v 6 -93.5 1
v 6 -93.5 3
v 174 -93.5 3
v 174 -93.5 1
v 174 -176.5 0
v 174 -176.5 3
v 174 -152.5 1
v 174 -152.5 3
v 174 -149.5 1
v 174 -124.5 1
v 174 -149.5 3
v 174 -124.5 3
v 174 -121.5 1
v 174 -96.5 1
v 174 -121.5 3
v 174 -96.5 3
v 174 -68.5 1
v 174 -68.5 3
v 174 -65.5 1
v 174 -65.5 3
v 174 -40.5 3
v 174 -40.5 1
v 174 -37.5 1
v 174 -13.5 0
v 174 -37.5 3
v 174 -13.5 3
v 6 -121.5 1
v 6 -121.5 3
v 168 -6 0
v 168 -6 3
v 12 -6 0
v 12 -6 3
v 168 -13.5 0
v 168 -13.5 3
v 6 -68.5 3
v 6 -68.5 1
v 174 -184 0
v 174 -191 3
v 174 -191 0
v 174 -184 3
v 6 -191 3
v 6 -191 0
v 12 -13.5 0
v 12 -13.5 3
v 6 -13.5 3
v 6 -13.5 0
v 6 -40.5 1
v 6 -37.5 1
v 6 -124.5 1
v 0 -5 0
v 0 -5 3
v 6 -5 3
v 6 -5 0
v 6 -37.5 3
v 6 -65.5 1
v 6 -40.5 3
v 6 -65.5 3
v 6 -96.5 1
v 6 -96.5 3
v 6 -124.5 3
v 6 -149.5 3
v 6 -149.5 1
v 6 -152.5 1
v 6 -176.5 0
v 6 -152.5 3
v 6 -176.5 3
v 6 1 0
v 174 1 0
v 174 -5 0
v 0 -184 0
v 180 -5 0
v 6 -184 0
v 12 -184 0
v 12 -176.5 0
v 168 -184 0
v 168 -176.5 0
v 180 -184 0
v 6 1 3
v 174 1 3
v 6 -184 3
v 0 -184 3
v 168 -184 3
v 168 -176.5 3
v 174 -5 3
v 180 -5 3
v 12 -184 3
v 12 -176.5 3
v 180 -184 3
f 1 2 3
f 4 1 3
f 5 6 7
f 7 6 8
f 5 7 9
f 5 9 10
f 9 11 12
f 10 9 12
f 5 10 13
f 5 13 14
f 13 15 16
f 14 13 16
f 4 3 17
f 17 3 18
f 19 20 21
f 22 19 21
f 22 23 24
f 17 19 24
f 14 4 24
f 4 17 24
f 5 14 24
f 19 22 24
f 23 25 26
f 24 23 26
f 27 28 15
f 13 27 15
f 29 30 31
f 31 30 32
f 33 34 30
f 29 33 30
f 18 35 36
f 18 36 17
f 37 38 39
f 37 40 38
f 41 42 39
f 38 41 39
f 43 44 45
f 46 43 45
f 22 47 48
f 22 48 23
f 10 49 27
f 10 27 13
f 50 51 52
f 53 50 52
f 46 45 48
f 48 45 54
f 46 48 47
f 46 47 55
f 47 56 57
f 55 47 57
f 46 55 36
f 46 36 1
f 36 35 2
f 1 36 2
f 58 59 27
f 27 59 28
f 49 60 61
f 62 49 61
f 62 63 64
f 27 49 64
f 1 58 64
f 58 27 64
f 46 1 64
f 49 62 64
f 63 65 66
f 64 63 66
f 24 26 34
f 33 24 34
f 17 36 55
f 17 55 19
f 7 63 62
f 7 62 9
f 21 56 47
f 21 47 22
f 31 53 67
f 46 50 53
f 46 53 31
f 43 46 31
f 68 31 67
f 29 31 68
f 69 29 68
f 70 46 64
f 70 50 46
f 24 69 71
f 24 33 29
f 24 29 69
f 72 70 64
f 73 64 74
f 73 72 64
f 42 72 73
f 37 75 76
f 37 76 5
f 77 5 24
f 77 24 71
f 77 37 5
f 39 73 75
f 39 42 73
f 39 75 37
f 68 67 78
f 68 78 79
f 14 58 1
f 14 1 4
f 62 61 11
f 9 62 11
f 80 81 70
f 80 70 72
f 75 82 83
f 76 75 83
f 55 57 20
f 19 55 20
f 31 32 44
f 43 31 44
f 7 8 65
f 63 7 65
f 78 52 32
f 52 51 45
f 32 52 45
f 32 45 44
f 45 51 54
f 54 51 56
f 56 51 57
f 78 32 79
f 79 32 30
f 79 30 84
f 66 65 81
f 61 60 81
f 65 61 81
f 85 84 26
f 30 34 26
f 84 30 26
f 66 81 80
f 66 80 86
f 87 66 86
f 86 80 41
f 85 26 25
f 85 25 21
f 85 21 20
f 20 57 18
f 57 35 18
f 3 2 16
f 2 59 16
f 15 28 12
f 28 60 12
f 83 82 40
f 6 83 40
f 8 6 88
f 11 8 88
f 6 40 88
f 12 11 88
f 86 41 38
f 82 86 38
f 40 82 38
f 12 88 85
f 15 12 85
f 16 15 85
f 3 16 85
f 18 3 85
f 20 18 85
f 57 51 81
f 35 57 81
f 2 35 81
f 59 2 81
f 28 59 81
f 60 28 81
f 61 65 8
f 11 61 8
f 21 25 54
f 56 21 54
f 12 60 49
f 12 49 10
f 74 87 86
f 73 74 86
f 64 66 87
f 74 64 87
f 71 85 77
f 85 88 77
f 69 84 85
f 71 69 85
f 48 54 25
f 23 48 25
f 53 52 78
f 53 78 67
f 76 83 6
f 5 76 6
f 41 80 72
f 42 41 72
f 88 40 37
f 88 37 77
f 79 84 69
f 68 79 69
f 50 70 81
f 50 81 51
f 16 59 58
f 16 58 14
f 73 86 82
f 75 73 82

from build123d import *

# Parameters (mm, degrees)
F0_W      = 180
F0_H      = 190
F1_DEPTH  = 3
F2_W      = 6
F2_H      = 6
F3_DEPTH  = 3.001
F4_W      = 168
F4_H      = 25
F5_DEPTH  = 3.001
F6_DEPTH  = 1
F7_DEPTH  = 1
F8_DEPTH  = 1
F9_W      = 168
F9_H      = 134.1867442131
F10_DEPTH = 1


with BuildPart() as f1:
    # F0 (on Top) → F1 (new body)
    with BuildSketch(Plane.XY):
        with Locations((90, -95)):
            Rectangle(F0_W, F0_H)
    extrude(amount=F1_DEPTH)

    # F2 (on face) → F3 (cut, through all)
    with BuildSketch(Plane.XY.offset(3)):
        with Locations((3, -187)):
            Rectangle(F2_W, F2_H)
        with Locations((177, -187)):
            Rectangle(F2_W, F2_H)
        with Locations((177, -3)):
            Rectangle(F2_W, F2_H)
        with Locations((3, -3)):
            Rectangle(F2_W, F2_H)
    extrude(amount=-F3_DEPTH, mode=Mode.SUBTRACT)

    # F4 (on face) → F5 (cut, through all)
    with BuildSketch(Plane.XY.offset(3)):
        Polygon((6, -152.5), (6, -176.5), (12, -176.5), (12, -184), (168, -184), (168, -176.5), (174, -176.5), (174, -152.5), align=None)
        with Locations((90, -137)):
            Rectangle(F4_W, F4_H)
        with Locations((90, -109)):
            Rectangle(F4_W, F4_H)
        with Locations((90, -81)):
            Rectangle(F4_W, F4_H)
        with Locations((90, -53)):
            Rectangle(F4_W, F4_H)
        Polygon((6, -13.5), (6, -37.5), (174, -37.5), (174, -13.5), (167.9999051407, -13.5), (168, -6.0000000006), (12, -6), (11.9999051407, -13.5), align=None)
    extrude(amount=-F5_DEPTH, mode=Mode.SUBTRACT)

    # F6 (add): a face of the model
    f6_faces = [f1.faces().sort_by_distance(p)[0] for p in [
        (90, -190, 1.5),
    ]]
    extrude(f6_faces, amount=F6_DEPTH)

    # F7 (add): a face of the model
    f7_faces = [f1.faces().sort_by_distance(p)[0] for p in [
        (90, 0, 1.5),
    ]]
    extrude(f7_faces, amount=F7_DEPTH)

    # F8 (add): faces of the model
    f8_faces = [f1.faces().sort_by_distance(p)[0] for p in [
        (177, -6, 1.5),
        (3, -6, 1.5),
        (3, -184, 1.5),
        (177, -184, 1.5),
    ]]
    extrude(f8_faces, amount=F8_DEPTH, dir=(0, 1, 0))

    # F9 (on face) → F10 (cut)
    with BuildSketch(Plane(origin=(0, 0, 0), x_dir=(1, 0, 0), z_dir=(0, 0, -1))):
        with Locations((90, 92.5933721066)):
            Rectangle(F9_W, F9_H)
    extrude(amount=-F10_DEPTH, mode=Mode.SUBTRACT)


solid = f1.part
